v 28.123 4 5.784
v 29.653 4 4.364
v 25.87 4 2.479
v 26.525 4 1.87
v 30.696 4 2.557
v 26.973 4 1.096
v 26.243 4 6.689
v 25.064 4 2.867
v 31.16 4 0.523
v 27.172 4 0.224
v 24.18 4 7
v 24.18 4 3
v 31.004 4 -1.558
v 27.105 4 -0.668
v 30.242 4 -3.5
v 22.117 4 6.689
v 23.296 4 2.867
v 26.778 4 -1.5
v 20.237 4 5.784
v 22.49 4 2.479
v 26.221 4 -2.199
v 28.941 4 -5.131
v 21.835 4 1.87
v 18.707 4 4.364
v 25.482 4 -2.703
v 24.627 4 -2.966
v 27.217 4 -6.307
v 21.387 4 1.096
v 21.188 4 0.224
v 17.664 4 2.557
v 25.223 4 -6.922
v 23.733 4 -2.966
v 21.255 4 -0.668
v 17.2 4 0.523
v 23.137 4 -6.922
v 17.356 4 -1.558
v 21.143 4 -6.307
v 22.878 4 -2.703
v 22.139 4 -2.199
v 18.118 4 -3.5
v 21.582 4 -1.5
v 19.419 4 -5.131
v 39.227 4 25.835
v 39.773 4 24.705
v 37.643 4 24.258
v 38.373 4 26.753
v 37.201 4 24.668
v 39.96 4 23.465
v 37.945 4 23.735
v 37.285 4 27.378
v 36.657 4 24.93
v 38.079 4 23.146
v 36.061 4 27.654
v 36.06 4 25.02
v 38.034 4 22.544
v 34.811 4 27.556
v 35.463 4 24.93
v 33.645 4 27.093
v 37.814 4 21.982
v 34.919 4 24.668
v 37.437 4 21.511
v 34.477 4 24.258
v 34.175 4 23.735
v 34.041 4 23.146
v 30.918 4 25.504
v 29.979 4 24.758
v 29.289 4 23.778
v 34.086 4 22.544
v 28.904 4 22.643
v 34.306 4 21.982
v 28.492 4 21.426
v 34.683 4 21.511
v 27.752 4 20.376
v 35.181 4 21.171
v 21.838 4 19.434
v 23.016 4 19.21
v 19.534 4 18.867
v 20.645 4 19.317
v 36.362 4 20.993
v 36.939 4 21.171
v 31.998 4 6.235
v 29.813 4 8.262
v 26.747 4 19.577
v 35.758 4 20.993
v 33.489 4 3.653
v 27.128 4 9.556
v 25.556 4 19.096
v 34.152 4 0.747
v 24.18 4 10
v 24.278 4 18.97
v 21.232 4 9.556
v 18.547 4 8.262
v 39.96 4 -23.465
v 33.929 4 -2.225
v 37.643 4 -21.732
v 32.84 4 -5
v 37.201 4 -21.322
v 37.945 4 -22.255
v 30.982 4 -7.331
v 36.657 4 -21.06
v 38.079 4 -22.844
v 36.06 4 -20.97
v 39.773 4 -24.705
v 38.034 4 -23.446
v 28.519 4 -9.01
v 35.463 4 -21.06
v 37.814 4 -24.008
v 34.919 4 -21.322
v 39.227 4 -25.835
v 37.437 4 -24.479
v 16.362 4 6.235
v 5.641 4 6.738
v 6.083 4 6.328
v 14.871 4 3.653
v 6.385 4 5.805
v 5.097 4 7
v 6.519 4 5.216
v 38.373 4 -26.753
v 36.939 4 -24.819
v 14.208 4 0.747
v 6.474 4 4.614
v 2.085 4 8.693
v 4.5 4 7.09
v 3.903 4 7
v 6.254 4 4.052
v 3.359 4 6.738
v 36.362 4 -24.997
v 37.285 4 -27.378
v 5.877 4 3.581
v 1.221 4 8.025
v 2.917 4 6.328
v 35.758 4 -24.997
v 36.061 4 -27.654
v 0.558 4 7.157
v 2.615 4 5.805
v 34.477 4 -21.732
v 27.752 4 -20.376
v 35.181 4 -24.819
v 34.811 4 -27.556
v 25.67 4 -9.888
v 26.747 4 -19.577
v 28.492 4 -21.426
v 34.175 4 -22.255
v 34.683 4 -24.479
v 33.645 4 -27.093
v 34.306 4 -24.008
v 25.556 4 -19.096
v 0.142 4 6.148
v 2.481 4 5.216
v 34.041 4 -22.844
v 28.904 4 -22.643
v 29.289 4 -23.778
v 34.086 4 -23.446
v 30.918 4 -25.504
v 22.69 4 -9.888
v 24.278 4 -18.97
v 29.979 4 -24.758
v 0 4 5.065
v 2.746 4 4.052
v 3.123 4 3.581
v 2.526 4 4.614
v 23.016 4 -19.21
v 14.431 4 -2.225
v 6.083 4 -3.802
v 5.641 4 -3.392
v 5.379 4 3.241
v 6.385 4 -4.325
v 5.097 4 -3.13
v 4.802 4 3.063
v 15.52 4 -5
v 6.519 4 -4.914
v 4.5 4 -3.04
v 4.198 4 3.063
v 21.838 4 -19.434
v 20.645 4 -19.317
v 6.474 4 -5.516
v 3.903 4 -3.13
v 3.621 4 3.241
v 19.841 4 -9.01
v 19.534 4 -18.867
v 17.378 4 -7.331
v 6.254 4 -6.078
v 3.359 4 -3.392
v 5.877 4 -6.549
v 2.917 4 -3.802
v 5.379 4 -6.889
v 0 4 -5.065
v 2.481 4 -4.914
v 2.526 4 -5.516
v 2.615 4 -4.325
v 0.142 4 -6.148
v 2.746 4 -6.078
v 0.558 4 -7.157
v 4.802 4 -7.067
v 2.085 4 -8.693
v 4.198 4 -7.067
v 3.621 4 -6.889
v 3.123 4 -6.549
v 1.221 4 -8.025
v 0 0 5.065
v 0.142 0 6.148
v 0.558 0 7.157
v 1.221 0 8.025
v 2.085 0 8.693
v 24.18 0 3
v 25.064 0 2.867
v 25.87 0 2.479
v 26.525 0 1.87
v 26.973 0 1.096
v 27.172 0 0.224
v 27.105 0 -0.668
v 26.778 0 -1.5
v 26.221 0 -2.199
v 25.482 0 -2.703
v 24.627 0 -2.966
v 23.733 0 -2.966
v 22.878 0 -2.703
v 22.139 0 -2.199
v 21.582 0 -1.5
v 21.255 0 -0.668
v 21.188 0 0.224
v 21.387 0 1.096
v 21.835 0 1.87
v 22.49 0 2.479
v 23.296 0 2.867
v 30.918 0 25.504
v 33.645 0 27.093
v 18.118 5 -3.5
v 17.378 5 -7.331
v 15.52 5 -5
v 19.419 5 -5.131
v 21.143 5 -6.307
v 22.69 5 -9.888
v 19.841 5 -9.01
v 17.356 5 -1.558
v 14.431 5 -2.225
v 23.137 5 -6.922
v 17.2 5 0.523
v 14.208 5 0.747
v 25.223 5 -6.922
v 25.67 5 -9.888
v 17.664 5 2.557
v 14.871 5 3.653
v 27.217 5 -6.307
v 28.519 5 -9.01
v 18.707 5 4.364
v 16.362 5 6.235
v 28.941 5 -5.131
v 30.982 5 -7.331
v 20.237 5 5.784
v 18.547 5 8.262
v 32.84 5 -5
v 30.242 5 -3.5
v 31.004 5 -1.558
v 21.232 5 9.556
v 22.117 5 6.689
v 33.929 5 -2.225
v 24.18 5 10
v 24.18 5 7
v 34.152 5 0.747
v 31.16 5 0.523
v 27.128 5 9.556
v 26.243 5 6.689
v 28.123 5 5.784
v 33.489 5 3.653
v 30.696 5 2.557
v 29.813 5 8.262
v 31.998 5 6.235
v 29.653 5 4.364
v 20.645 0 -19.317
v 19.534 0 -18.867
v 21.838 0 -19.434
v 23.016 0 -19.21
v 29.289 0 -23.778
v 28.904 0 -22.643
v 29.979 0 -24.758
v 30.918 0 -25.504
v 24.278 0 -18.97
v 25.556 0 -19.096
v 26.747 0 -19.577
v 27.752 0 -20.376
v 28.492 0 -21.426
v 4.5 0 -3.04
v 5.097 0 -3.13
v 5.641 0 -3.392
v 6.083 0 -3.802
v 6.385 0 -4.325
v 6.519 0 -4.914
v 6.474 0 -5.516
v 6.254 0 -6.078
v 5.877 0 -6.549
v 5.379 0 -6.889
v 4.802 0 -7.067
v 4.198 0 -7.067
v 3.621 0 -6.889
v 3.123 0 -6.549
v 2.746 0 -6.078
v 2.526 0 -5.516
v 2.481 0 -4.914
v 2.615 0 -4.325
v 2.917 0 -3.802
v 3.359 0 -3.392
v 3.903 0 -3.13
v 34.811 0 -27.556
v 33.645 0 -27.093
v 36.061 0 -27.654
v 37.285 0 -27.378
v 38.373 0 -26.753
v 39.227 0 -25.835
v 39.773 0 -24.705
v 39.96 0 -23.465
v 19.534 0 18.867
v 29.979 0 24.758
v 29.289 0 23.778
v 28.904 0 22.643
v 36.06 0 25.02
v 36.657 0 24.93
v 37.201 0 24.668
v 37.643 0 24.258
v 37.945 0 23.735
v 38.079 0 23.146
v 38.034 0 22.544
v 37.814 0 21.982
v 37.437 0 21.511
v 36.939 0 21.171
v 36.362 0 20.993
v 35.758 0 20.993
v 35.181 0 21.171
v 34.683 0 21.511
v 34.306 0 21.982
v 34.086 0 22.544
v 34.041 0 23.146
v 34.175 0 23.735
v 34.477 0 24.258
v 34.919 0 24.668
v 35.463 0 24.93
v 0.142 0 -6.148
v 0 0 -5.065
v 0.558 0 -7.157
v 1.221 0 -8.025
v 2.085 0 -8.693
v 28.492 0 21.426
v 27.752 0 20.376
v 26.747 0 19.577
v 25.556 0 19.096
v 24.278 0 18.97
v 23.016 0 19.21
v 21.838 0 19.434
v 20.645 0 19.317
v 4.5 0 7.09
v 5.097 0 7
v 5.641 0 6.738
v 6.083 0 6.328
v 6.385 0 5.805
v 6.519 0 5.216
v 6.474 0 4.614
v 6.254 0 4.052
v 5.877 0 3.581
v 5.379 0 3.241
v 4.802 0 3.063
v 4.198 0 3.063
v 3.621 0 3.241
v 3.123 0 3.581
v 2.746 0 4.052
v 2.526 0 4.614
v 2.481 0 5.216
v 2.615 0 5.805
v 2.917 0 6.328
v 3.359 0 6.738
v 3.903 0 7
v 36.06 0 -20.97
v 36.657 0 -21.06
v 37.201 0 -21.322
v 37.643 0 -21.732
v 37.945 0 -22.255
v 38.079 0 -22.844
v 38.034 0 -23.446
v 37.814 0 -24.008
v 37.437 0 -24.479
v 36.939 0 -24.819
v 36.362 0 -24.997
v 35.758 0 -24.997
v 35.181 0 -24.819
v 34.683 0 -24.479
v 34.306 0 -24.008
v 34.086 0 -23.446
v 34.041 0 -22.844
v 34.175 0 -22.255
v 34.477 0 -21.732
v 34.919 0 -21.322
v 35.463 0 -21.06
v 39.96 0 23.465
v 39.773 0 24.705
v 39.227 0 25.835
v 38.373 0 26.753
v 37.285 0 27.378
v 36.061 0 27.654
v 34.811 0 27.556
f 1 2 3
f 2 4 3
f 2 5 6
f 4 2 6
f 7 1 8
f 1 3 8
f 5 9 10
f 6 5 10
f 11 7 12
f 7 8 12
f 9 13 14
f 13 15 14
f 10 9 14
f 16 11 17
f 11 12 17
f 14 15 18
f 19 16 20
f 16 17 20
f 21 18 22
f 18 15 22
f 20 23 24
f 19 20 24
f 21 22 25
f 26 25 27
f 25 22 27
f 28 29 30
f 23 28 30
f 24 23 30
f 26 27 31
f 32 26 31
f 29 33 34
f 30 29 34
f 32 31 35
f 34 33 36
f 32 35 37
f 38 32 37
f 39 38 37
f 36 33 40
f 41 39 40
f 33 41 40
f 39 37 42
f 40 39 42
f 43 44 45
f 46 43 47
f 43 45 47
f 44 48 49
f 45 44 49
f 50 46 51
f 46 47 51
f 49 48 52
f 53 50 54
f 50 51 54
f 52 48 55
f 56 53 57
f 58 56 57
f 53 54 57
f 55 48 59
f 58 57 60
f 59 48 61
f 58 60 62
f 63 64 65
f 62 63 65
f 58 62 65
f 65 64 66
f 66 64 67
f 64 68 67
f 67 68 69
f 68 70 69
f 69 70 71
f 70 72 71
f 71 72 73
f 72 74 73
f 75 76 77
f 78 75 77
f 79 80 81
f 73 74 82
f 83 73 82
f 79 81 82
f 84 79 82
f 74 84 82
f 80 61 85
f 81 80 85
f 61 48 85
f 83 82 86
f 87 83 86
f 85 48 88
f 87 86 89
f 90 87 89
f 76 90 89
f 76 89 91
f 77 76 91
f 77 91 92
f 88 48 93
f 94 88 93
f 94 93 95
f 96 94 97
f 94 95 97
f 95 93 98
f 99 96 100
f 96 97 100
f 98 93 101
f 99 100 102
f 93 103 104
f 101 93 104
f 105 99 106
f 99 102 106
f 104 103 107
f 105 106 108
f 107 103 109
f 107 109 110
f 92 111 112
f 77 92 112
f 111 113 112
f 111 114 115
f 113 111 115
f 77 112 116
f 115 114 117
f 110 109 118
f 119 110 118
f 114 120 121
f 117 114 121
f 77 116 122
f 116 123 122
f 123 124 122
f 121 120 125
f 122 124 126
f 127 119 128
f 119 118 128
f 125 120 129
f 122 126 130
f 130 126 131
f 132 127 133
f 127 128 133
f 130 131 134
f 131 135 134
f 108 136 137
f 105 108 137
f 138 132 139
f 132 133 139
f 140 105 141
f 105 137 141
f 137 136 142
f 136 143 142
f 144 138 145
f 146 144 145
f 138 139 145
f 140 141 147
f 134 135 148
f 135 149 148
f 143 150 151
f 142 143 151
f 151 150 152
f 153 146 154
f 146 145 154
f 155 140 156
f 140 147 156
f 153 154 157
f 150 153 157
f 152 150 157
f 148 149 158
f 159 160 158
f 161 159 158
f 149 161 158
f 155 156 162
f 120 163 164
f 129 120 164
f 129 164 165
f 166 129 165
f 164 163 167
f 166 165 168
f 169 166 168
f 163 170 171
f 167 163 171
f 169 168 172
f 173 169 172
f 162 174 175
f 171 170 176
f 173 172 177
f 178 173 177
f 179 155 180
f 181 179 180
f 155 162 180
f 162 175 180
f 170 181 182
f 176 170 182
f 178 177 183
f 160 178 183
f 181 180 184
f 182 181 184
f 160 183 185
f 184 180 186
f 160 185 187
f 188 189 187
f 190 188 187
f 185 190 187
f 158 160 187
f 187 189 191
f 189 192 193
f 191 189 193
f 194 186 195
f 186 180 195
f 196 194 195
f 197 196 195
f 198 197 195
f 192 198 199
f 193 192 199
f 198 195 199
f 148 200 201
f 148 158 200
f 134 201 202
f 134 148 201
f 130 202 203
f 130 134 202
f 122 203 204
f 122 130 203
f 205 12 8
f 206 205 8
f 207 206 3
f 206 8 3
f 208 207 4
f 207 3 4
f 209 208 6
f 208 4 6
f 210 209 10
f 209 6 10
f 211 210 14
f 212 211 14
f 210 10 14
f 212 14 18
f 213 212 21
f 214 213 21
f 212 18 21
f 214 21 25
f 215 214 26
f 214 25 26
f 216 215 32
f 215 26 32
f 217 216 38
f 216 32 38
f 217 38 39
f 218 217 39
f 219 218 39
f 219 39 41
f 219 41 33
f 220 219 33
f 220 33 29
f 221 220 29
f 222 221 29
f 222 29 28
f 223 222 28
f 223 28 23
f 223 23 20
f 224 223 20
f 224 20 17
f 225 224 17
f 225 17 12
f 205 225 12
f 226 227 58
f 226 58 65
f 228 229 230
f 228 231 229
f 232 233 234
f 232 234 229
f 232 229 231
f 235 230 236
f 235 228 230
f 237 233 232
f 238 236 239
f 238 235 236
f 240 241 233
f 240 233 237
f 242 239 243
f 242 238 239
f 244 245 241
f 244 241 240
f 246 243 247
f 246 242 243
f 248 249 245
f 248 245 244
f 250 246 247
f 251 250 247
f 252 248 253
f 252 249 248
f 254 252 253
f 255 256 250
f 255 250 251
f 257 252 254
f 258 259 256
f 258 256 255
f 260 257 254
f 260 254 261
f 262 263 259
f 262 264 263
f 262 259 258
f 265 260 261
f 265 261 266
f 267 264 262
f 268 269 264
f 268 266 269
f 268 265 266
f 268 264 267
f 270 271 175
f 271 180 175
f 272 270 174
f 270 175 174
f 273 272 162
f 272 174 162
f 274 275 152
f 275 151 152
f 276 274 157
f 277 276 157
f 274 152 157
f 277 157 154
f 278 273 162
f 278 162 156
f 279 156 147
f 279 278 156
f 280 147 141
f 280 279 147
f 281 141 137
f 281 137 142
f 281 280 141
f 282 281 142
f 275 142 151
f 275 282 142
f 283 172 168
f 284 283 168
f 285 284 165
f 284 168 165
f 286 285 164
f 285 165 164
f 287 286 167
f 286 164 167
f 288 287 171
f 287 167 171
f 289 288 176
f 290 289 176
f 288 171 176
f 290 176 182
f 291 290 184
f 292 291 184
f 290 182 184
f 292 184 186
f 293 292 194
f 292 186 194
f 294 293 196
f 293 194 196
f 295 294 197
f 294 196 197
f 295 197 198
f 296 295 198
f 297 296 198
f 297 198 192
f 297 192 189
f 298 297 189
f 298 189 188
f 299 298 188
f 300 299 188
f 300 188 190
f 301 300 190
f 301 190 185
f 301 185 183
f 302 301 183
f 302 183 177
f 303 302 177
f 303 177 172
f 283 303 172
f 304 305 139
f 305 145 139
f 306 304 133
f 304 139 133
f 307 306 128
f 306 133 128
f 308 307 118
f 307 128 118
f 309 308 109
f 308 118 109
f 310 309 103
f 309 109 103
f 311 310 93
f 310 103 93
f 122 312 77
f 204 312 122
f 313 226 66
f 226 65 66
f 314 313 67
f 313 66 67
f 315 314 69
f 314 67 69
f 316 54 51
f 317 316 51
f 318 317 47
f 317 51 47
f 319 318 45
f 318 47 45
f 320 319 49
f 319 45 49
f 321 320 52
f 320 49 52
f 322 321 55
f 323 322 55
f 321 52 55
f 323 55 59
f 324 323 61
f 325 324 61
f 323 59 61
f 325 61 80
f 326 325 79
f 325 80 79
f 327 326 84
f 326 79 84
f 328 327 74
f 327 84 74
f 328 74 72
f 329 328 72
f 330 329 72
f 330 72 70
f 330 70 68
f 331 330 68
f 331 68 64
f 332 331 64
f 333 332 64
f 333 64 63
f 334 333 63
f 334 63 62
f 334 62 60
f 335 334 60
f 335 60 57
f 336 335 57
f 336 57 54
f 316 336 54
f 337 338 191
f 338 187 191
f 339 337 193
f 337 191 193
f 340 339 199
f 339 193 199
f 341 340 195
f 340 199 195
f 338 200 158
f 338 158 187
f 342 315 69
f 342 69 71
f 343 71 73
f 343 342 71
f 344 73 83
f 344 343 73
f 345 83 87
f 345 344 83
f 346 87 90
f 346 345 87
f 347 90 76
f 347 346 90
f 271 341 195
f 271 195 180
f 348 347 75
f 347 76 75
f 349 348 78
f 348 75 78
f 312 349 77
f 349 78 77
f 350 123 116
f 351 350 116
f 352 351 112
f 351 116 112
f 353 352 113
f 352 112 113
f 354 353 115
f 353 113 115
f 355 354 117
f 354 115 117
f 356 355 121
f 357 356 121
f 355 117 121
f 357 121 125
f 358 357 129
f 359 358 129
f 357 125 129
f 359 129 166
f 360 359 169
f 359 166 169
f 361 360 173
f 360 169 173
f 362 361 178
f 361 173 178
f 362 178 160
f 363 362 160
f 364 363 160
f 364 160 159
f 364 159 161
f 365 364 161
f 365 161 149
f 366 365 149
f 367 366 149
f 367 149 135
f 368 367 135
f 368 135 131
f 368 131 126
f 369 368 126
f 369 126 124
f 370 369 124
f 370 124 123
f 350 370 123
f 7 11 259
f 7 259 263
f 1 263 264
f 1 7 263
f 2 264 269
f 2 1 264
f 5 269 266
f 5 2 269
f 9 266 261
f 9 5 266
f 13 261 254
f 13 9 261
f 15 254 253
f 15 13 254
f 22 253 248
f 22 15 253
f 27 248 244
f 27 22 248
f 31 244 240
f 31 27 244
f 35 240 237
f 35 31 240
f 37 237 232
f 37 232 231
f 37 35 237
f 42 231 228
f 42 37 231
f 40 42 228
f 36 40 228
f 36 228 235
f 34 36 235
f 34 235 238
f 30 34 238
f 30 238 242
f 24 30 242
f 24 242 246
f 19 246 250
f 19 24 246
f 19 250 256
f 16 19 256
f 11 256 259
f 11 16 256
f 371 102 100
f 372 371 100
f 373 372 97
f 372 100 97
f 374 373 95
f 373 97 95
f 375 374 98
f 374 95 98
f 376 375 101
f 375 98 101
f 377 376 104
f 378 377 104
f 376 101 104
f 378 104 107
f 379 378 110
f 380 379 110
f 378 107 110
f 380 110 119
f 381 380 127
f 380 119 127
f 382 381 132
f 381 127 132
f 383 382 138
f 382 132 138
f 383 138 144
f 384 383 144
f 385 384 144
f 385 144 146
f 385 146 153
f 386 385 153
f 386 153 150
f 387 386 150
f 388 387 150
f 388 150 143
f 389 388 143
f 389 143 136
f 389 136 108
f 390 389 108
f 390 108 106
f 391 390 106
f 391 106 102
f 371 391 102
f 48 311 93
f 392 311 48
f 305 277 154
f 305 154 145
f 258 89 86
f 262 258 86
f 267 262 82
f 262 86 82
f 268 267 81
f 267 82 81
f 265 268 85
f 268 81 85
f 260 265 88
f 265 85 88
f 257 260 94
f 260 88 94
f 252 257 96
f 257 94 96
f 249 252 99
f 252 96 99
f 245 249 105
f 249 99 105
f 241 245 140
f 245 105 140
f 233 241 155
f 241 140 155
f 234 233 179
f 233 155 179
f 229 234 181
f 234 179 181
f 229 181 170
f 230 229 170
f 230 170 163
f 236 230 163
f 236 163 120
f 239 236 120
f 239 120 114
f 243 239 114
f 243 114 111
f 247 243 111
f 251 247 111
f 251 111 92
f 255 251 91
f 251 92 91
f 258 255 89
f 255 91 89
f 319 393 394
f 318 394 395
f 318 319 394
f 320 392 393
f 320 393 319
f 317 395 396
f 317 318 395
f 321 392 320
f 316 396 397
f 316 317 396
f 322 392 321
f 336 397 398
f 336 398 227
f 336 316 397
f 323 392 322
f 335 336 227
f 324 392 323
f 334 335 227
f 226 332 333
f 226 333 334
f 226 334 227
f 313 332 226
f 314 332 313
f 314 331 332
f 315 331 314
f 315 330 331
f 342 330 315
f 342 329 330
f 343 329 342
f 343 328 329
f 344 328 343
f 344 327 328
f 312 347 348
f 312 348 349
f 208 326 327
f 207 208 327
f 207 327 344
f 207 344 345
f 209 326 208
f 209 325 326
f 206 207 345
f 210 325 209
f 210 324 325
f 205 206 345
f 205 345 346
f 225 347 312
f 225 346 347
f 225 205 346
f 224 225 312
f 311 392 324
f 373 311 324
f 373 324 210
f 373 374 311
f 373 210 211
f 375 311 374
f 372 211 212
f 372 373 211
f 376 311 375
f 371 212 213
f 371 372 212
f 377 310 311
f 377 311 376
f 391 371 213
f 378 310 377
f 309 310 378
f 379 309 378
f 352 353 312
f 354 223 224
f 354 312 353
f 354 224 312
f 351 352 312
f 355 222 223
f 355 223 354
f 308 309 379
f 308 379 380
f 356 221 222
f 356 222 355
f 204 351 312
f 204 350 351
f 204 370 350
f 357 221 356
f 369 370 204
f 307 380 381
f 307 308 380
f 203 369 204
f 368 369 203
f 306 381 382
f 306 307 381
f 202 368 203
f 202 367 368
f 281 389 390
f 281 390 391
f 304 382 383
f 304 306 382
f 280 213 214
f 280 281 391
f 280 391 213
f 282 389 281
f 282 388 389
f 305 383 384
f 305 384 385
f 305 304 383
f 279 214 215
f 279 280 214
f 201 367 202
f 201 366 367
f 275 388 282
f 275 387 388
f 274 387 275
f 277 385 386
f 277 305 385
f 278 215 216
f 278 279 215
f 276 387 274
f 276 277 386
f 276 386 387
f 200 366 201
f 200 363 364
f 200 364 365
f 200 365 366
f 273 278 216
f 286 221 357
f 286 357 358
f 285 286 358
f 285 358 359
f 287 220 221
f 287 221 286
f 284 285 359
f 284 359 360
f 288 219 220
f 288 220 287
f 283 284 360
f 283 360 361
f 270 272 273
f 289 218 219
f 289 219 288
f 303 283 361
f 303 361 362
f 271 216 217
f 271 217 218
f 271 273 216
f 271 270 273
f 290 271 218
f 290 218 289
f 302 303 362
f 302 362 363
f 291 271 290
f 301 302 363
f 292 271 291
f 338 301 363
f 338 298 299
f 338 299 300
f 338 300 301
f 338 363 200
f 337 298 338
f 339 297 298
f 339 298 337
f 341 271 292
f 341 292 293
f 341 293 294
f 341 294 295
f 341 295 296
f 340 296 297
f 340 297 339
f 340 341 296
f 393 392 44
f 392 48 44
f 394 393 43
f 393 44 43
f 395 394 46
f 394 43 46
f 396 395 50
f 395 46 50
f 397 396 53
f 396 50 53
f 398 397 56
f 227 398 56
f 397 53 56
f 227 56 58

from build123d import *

# Parameters (mm, degrees)
BOSS_EXTRUDE1_DEPTH = 4
FILLET1_R           = 4.2
SKETCH3_R           = 3
SKETCH3_R_2         = 2.025
CUT_EXTRUDE1_DEPTH  = 49.76638045
SKETCH2_R           = 10
SKETCH2_R_2         = 7
BOSS_EXTRUDE2_DEPTH = 1


with BuildPart() as part:
    # Sketch1 → Boss-Extrude1 (new body)
    with BuildSketch(Plane(origin=(0, 0, 0), x_dir=(1, 0, 0), z_dir=(0, 1, 0))):
        with BuildLine():
            Line((0, -7.47801578), (0, 7.47801578))
            Line((0, 7.47801578), (21.555297549, 20.045096945))
            ThreePointArc((21.555297549, 20.045096945), (26.746562982, 19.577458446), (28.897035116, 24.325446668))
            Line((28.897035116, 24.325446668), (39.960063413, 30.775368049))
            Line((39.960063413, 30.775368049), (39.960063413, -30.775340317))
            Line((39.960063413, -30.775340317), (28.897031775, -24.325424666))
            ThreePointArc((28.897031775, -24.325424666), (26.746553125, -19.577458381), (21.555304058, -20.04508578))
            Line((21.555304058, -20.04508578), (0, -7.47801578))
        make_face()
    extrude(amount=BOSS_EXTRUDE1_DEPTH)

    # Fillet1
    fillet1_edges = [part.edges().sort_by_distance(p)[0] for p in [
        (0, 2, 7.47801578),
        (0, 2, -7.47801578),
        (21.555297549, 2, -20.045096945),
        (28.897035116, 2, -24.325446668),
        (39.960063413, 2, -30.775368049),
        (39.960063413, 2, 30.775340317),
        (28.897031775, 2, 24.325424666),
        (21.555304058, 2, 20.04508578),
    ]]
    fillet(fillet1_edges, radius=FILLET1_R)

    # Sketch3 → Cut-Extrude1 (cut, through all)
    with BuildSketch(Plane(origin=(0, 4, 0), x_dir=(1, 0, 0), z_dir=(0, 1, 0))):
        with Locations(Location((24.18, 0, 0), (0, 0, 270))):
            Circle(SKETCH3_R)
        with Locations(Location((36.06, -22.995, 0), (0, 0, 270))):
            Circle(SKETCH3_R_2)
        with Locations(Location((36.06, 22.995, 0), (0, 0, 270))):
            Circle(SKETCH3_R_2)
        with Locations(Location((4.5, 5.065, 0), (0, 0, 270))):
            Circle(SKETCH3_R_2)
        with Locations(Location((4.5, -5.065, 0), (0, 0, 270))):
            Circle(SKETCH3_R_2)
    extrude(amount=-CUT_EXTRUDE1_DEPTH, mode=Mode.SUBTRACT)

    # Sketch2 → Boss-Extrude2 (add)
    with BuildSketch(Plane(origin=(0, 4, 0), x_dir=(1, 0, 0), z_dir=(0, 1, 0))):
        with Locations(Location((24.18, 0, 0), (0, 0, 270))):
            Circle(SKETCH2_R)
        with Locations(Location((24.18, 0, 0), (0, 0, 270))):
            Circle(SKETCH2_R_2, mode=Mode.SUBTRACT)
    extrude(amount=BOSS_EXTRUDE2_DEPTH)


solid = part.part
